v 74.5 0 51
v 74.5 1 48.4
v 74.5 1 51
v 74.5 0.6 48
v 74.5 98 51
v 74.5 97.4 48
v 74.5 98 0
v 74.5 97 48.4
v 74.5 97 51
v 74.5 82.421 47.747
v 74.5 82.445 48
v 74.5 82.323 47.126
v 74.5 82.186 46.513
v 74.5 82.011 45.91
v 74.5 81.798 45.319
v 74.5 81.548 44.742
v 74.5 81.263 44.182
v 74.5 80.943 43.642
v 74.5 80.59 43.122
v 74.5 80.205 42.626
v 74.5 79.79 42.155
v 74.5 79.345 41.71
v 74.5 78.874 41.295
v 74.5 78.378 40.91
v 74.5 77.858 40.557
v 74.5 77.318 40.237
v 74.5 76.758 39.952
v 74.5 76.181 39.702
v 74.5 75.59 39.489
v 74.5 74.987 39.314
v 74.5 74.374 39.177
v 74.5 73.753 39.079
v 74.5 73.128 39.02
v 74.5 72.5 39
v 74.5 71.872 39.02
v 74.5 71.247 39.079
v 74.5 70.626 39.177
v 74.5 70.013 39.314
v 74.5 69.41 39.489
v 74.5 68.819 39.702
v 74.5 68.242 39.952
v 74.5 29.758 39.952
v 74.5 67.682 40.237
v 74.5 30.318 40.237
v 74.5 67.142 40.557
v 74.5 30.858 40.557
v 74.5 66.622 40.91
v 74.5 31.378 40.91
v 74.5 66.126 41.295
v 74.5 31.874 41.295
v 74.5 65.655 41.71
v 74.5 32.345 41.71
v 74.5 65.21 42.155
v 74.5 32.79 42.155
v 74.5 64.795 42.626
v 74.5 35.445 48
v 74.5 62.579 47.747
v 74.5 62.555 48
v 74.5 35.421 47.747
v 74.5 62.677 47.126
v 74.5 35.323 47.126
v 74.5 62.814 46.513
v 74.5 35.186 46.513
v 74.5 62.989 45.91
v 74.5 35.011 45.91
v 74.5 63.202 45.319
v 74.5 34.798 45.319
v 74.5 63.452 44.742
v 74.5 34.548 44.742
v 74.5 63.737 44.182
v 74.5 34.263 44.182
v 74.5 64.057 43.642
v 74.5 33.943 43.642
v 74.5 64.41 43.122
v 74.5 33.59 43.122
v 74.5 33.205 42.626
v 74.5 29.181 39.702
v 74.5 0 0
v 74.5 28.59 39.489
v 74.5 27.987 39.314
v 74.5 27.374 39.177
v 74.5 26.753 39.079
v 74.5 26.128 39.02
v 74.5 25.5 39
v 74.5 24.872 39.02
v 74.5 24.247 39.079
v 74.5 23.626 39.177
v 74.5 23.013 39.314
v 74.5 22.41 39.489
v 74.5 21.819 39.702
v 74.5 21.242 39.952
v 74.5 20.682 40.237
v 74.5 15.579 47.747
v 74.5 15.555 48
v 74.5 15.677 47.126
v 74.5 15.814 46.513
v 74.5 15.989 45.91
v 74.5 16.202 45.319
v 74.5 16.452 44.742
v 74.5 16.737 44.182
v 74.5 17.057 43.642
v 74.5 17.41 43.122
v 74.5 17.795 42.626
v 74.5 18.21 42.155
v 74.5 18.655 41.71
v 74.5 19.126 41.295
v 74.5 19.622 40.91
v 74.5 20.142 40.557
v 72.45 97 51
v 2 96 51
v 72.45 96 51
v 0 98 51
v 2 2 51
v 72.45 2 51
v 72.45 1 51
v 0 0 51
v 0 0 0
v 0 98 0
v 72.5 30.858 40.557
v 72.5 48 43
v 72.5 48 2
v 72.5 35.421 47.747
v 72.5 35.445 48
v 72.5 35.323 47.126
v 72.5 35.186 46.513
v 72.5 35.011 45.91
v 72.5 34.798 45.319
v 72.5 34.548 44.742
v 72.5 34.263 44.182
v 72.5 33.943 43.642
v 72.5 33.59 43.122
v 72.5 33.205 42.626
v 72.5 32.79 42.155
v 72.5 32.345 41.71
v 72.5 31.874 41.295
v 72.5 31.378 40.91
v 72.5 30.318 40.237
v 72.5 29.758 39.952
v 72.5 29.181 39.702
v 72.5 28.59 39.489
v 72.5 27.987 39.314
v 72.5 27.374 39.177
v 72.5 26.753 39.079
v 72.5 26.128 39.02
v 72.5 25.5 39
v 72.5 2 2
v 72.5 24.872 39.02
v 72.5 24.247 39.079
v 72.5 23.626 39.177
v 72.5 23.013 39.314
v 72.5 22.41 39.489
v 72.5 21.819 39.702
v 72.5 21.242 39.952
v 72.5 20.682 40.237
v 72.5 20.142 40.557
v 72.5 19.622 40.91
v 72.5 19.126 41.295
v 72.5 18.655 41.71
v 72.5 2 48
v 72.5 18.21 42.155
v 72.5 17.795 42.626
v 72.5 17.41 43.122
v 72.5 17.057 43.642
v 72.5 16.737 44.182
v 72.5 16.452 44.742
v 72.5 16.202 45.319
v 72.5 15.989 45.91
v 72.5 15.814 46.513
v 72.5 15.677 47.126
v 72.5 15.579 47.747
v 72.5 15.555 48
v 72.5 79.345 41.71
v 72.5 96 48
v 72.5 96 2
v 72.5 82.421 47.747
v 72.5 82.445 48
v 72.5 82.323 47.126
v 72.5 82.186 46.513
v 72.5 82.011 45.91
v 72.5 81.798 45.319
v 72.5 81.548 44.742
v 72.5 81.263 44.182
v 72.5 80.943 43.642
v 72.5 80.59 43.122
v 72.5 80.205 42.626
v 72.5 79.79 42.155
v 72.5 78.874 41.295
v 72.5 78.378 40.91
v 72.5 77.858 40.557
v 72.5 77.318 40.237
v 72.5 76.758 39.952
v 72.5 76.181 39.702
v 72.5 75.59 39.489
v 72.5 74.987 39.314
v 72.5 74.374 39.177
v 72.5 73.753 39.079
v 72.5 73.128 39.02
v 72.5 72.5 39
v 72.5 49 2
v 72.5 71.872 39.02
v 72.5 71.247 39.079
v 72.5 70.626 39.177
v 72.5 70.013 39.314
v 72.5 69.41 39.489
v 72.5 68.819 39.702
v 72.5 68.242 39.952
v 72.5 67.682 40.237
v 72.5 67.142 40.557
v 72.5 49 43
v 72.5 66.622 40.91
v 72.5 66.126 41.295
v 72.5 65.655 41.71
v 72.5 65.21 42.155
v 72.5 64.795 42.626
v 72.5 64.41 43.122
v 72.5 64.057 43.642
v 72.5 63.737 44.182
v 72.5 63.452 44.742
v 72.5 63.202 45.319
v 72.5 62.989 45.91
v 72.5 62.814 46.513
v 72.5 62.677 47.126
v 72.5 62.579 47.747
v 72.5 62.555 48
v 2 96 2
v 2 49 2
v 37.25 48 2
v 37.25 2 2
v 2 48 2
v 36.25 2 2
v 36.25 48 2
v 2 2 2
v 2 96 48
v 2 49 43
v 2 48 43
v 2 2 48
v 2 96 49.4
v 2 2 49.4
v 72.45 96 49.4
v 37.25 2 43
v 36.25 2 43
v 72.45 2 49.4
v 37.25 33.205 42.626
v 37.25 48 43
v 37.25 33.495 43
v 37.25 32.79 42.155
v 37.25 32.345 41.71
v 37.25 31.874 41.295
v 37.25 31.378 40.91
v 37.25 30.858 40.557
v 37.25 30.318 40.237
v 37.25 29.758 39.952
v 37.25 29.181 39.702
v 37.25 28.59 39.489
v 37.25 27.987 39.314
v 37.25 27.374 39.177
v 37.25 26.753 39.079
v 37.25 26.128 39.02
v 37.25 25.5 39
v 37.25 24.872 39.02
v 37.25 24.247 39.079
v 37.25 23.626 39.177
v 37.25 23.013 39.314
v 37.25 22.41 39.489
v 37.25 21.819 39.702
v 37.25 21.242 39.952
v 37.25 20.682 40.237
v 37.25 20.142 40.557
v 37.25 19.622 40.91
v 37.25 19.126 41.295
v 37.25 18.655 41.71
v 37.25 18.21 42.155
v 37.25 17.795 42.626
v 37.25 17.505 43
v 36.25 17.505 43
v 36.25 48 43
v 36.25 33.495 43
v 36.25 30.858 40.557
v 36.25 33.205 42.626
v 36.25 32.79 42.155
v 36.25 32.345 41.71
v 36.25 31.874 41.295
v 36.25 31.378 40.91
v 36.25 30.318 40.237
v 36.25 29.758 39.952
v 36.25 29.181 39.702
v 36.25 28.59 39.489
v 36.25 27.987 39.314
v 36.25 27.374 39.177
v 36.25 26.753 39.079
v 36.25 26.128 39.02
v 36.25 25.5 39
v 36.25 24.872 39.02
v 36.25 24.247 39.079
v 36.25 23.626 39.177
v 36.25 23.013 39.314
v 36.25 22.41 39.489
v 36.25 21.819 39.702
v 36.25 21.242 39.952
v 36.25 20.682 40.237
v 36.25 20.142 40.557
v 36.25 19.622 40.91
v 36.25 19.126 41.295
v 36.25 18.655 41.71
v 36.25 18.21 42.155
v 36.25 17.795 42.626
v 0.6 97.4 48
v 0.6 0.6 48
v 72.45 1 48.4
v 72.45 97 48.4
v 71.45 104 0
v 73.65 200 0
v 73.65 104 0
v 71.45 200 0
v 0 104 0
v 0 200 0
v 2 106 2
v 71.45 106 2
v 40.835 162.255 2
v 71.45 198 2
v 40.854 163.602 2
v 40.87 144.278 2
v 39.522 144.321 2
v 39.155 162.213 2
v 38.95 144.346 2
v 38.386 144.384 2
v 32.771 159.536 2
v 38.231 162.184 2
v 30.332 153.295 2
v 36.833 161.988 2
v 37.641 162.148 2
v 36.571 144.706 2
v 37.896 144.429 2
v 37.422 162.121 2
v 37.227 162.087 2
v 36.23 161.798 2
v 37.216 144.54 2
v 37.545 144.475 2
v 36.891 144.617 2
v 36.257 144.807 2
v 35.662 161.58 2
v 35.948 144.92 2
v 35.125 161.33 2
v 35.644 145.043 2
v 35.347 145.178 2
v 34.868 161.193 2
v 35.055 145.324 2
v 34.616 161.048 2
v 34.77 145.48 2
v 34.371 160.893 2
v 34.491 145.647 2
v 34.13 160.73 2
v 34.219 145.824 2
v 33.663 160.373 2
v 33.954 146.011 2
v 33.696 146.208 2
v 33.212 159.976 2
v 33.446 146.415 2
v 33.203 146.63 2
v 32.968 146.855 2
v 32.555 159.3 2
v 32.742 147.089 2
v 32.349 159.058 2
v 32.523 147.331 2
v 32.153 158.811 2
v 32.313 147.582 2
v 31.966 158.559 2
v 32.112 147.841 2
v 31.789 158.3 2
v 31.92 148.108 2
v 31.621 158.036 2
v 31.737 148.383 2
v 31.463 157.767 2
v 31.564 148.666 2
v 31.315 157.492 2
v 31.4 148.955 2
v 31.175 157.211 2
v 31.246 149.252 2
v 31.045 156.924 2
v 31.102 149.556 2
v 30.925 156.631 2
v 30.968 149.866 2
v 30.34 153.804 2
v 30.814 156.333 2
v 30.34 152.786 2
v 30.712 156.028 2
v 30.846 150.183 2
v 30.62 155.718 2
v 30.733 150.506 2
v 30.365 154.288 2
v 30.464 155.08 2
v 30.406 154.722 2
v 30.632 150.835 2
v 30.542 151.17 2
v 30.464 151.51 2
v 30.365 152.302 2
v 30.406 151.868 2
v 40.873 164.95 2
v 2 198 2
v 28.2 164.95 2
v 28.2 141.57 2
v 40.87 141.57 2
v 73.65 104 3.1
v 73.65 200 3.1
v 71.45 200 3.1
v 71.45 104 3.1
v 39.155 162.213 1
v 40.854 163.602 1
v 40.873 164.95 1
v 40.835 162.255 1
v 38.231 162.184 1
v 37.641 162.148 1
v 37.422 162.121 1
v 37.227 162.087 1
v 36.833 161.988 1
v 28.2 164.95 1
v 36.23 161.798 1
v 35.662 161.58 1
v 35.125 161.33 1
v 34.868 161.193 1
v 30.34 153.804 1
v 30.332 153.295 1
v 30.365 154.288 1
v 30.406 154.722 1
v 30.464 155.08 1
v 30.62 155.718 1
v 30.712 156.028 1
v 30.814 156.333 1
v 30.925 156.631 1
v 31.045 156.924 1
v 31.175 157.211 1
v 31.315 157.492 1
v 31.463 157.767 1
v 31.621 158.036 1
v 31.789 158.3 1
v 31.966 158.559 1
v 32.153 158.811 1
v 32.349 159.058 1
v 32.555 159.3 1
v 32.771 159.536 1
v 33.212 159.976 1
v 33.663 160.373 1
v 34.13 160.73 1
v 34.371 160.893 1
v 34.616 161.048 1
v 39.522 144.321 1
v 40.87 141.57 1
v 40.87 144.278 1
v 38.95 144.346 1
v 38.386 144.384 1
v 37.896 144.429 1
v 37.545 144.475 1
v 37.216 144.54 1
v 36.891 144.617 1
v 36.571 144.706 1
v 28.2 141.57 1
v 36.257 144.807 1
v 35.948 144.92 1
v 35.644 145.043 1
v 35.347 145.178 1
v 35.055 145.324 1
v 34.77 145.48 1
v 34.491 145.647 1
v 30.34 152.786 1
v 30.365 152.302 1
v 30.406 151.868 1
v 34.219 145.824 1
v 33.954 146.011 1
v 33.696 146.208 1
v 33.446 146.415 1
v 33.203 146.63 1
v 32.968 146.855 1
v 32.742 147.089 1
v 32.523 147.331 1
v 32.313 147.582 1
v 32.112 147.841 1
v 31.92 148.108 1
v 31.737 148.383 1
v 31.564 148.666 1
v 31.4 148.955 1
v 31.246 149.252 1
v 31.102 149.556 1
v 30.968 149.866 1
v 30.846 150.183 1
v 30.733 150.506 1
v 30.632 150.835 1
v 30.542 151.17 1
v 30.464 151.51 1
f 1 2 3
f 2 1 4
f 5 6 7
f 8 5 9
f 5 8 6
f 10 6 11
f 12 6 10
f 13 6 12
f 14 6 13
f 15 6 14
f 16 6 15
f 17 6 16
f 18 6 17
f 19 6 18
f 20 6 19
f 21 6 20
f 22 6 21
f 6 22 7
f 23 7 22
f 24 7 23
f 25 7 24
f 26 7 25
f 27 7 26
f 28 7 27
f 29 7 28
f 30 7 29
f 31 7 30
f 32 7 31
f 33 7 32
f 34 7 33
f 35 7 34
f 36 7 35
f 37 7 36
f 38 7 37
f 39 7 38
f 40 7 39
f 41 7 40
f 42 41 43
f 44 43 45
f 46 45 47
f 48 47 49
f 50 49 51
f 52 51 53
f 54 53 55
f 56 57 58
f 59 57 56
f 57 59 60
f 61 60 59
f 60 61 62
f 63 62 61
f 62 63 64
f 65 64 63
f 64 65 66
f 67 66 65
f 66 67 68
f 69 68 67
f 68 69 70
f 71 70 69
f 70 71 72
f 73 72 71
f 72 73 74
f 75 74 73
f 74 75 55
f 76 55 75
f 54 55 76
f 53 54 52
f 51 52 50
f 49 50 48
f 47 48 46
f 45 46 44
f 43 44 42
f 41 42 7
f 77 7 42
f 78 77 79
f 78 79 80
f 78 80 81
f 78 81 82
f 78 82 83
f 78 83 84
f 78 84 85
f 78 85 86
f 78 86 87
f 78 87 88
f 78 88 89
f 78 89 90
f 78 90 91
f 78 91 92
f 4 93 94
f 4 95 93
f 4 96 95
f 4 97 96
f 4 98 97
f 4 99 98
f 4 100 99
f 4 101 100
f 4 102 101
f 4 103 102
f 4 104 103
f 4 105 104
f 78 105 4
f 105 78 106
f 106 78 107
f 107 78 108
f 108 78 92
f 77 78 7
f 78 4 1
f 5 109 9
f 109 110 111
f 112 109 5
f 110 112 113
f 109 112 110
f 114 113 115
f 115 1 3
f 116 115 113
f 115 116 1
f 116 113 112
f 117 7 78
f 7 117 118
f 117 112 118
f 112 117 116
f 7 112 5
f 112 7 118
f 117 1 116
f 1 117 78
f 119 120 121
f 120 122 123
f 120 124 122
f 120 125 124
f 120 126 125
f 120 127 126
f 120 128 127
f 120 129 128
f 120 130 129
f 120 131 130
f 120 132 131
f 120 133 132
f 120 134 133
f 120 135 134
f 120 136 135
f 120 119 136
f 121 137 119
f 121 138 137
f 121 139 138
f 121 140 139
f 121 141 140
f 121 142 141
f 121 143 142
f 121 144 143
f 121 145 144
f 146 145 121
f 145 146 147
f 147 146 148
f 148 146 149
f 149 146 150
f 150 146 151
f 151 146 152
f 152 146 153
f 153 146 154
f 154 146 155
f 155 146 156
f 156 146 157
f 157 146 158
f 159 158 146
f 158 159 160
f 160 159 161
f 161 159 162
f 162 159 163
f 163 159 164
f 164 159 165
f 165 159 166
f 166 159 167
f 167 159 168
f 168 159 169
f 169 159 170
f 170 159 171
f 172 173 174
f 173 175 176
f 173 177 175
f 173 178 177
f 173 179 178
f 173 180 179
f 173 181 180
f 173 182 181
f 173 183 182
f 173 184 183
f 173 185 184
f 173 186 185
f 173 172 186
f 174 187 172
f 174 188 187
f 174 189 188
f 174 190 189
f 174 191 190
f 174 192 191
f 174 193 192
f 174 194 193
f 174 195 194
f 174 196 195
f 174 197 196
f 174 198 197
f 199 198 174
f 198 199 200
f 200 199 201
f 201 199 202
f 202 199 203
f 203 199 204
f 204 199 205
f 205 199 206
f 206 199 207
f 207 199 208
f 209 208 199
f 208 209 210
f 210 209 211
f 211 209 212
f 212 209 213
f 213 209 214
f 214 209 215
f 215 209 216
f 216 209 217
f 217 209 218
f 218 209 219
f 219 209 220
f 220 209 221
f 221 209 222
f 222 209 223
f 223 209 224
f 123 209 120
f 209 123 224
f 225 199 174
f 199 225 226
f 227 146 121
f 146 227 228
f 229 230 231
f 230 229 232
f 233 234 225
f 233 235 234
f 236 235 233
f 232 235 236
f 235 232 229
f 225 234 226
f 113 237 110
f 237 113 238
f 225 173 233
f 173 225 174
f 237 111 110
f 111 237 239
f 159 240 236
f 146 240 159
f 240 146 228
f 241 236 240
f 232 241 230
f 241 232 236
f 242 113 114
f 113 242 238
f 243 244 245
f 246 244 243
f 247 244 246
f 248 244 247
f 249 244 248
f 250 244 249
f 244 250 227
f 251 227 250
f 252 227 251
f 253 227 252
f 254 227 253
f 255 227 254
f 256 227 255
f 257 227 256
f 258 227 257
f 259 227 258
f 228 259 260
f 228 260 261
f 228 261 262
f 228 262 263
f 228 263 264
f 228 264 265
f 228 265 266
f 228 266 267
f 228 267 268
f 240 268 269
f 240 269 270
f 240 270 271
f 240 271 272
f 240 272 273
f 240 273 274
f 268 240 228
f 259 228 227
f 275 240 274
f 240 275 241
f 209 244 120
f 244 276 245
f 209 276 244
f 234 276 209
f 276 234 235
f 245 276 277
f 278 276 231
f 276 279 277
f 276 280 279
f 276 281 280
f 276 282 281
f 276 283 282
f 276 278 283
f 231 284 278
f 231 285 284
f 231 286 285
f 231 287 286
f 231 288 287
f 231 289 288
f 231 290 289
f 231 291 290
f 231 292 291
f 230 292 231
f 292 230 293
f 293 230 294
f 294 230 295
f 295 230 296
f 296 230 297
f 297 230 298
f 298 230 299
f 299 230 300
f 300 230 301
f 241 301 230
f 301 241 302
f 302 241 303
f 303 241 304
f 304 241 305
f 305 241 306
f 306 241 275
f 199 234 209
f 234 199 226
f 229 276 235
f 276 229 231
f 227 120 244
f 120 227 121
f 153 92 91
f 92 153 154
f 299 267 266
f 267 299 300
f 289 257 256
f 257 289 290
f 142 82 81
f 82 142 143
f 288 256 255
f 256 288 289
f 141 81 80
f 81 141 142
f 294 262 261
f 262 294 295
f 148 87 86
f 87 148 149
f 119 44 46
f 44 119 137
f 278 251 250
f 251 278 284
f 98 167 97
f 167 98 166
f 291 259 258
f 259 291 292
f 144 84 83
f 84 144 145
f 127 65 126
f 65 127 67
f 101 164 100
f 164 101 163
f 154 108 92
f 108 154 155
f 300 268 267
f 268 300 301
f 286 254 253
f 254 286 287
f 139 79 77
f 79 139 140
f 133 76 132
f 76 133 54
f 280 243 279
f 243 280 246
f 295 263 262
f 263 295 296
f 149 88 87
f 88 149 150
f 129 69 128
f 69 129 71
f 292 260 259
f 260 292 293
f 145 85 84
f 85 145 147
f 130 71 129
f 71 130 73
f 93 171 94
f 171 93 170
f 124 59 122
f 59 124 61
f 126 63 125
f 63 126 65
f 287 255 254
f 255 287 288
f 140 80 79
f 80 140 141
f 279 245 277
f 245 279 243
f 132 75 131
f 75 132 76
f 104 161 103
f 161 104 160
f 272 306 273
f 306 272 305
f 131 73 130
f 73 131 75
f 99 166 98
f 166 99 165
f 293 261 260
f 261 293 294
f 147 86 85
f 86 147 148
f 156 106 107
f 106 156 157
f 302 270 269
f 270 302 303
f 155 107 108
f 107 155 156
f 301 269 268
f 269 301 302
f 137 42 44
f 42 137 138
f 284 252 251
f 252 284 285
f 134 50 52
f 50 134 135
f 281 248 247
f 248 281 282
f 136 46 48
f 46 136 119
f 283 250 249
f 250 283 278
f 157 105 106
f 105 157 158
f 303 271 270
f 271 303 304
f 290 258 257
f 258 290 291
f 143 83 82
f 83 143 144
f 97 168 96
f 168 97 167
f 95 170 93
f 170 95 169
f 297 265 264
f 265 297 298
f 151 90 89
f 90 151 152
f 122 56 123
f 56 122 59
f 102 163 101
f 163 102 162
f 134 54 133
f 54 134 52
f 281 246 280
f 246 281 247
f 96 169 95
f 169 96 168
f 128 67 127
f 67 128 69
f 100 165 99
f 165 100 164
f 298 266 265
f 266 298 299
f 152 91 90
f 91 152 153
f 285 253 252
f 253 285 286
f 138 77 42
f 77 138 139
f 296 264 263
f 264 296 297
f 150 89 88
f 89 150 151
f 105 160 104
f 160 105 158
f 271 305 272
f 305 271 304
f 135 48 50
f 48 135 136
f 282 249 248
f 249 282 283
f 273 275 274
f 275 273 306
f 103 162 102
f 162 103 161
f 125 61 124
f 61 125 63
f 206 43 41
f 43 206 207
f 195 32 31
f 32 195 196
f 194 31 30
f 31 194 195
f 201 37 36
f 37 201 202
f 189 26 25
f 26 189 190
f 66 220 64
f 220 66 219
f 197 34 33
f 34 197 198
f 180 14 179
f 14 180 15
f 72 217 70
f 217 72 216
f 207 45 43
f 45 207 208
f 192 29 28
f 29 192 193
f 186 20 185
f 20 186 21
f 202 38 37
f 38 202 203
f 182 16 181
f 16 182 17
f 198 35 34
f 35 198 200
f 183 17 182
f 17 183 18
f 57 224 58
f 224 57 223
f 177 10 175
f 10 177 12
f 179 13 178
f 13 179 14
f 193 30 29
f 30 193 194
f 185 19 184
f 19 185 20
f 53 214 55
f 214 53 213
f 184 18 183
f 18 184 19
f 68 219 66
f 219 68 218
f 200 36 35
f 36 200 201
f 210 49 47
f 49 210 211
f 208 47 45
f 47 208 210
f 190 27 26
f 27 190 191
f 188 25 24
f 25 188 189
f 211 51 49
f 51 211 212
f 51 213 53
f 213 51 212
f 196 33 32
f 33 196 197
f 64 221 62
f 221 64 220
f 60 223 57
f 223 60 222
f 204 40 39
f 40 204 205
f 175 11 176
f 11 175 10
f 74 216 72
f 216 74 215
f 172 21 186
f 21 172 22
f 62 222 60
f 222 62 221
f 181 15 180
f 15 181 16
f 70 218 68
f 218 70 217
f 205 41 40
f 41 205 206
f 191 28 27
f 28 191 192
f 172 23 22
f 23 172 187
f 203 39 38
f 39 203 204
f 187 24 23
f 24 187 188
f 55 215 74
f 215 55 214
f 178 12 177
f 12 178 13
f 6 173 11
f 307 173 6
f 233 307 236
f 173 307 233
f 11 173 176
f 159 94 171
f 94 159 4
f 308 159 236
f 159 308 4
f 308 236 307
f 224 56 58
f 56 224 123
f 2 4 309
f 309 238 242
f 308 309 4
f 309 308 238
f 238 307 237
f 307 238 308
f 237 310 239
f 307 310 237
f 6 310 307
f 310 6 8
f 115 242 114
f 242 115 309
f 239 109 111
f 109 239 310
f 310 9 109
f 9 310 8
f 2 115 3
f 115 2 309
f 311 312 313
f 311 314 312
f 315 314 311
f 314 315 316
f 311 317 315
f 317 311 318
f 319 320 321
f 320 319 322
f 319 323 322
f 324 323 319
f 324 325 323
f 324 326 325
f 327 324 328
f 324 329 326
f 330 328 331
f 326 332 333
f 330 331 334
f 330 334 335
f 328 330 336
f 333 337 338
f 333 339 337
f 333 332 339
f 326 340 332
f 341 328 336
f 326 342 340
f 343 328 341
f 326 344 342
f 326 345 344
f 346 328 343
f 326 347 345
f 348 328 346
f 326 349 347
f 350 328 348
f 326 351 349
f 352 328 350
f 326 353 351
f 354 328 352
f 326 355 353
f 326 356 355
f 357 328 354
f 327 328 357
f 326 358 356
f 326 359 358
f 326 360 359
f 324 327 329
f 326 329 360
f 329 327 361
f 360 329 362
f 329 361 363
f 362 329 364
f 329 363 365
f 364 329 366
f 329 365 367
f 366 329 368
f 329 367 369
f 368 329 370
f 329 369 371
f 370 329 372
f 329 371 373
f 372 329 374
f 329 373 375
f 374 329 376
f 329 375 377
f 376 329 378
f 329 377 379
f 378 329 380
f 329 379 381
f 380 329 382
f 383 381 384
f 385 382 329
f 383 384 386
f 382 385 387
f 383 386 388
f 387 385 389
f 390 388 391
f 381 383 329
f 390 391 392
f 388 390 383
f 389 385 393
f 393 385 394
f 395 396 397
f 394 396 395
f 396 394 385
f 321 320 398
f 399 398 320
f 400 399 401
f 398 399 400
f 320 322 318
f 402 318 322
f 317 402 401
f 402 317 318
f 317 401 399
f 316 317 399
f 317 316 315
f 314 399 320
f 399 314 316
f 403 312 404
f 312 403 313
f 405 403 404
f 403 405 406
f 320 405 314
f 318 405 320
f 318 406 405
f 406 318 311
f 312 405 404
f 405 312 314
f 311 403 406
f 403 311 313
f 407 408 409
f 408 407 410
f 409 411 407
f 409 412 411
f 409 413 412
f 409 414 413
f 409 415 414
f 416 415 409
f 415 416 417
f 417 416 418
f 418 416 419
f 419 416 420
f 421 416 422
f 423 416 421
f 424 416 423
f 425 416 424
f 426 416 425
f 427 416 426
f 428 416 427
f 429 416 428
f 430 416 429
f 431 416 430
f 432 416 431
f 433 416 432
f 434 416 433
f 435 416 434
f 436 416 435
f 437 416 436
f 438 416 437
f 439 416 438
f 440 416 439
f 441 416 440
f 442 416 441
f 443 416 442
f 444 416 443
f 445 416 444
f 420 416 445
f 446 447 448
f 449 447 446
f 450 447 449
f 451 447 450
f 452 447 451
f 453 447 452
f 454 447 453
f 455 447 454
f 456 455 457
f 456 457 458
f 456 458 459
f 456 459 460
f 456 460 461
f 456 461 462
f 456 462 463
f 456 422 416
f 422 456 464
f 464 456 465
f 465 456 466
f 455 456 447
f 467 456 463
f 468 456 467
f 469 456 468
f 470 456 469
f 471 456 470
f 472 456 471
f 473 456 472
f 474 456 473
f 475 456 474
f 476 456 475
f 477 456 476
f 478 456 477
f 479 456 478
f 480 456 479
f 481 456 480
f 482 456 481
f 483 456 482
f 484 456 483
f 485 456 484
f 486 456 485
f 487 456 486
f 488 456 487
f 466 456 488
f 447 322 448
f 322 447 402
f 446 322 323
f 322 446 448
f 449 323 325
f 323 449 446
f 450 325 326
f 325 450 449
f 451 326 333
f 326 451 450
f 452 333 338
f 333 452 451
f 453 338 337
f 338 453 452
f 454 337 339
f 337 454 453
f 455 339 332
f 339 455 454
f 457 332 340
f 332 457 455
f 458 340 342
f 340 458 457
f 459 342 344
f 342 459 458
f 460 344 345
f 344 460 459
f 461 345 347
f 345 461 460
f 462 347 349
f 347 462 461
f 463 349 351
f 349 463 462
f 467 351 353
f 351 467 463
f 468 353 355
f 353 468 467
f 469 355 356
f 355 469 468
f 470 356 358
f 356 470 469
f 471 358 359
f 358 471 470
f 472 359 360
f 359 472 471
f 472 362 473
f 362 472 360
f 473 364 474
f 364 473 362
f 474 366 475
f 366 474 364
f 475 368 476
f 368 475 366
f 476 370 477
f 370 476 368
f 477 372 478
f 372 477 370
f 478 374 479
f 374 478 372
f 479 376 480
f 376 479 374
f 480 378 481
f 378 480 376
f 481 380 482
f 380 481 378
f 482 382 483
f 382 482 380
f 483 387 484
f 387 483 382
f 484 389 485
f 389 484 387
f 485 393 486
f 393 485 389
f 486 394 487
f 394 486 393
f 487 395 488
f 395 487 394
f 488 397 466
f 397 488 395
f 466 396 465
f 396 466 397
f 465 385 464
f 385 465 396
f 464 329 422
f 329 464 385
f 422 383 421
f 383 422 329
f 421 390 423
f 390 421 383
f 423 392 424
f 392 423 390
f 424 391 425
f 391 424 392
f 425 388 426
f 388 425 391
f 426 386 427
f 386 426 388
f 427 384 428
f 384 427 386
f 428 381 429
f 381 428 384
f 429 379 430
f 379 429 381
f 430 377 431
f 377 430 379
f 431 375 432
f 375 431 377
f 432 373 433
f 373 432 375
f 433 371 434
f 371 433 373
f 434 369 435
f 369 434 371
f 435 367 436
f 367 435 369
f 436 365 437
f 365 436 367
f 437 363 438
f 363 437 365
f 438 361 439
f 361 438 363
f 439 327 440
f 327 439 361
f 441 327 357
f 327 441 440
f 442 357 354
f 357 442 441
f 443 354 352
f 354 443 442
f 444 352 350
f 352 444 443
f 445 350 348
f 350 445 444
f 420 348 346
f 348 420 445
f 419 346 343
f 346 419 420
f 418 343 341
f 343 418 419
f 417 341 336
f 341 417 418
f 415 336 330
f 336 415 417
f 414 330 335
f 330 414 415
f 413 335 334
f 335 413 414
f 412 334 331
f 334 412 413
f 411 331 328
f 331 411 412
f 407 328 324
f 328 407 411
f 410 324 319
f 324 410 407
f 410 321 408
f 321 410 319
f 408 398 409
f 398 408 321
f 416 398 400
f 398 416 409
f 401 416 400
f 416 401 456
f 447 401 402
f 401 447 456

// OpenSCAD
// file: carcassonne_box.scad
/**
 * @file carcassonne_box.scad
 * @author Conlan Wesson
 * Template for Carcossonne boxes.
 * @copyright Creative Commons Attribution-NonCommercial-ShareAlike 4.0
 */

mm = 1;
cm = 10*mm;

width = 47*mm;
thick = 2.5*mm;
wall = 2*mm;

/**
 * Lid for box.
 * @param count Number of cards.
 * @param columns Number of columns.
 * @param icon Path to icon DXF file.
 * @param rot Icon rotation in degrees.
 * @param mult Icon scale.
 * @param xoff X-offset of icon from center.
 * @param yoff Y-offset of icon from center.
 */
module carcassonne_lid(count, columns=1, icon=false, rot=0, mult=1, xoff=0, yoff=0, g=0){
	length = (thick * count) + ((width/2) - ((thick * count) % (width/2)));
	w = length+(1.5*wall)+.1;
	l = (width*columns)+wall;
	h = wall;
	d = 2;

	CubePoints = [
		[ 0-g, 0-g,   0 ],  //0
		[ w+g, 0-g,   0 ],  //1
		[ w+g, l+g,   0 ],  //2
		[ 0-g, l+g,   0 ],  //3
		[   d,   d, h+g ],  //4
		[   w,   d, h+g ],  //5
		[   w, l-d, h+g ],  //6
		[   d, l-d, h+g ]   //7
	];
	
	CubeFaces = [
		[0,1,2,3],  // bottom
		[4,5,1,0],  // front
		[7,6,5,4],  // top
		[5,6,2,1],  // right
		[6,7,3,2],  // back
		[7,4,0,3]   // left
	];
	
	
	difference(){
		union(){
			polyhedron( CubePoints, CubeFaces );
			translate([w-wall-.15,0,0]) cube([wall+.2,l, (1.5*wall)+.1]);
		}
		if(icon){
			translate([w/2+xoff,l/3+yoff,h-(wall/2)]){
				linear_extrude(height=(wall)+.1){
					rotate(rot) scale(mult) import(icon);
				}
			}
		}
	}
}

/**
 * Carcassonne card box.
 * @param count Number of cards.
 * @param dividers Array of divider positions.
 * @param columns Number of columns.
 */
module carcassonne_box(count, dividers=[], columns=1){
	length = (thick * count) + ((width/2) - ((thick * count) % (width/2)));
	difference(){
		union(){
			difference(){
				// Outer walls
				cube([length+(2*wall), (width*columns)+(2*wall), width+(2*wall)]);
				// Cavity
				translate([wall, wall, wall]){
					cube([length, width*columns, (width+wall)+.1]);
				}
			}
			// Dividers
			for(col = [0:columns-1]){
				for(div = dividers[col]){
					translate([(div*(width/2))+(wall/2), width*col+wall, 0]) cube([wall/2, width, width-(2*wall)]);
				}
				if(col > 0){
					translate([0, width*col+(wall/2), 0]) cube([length+(2*wall), wall/2, width-(2*wall)]);
				}
			}
		}
		union(){
			// Notch
			for(col = [0:columns-1]){
				translate([wall, wall+(width*col), wall]){
					translate([0, width/2, width])
					rotate([0, 90, 0]){
						cylinder(r=10, h=length+(2*wall), $fn=100);
					}
				}
			}
			// Track
			translate([wall/2,wall/2,width+wall/2]) carcassonne_lid(count, columns, g=0.4);
		}
	}
}
// main file
/**
 * @file bridgescastlesbazaars.scad
 * @author Conlan Wesson
 * Bridges, Castles, and Bazaars Carcossonne box.
 * @copyright Creative Commons Attribution-NonCommercial-ShareAlike 4.0
 */

include <carcassonne_box.scad>

count = 24;
dividers = [[1.5]];
columns = 2;

carcassonne_box(count, dividers, columns);
translate([0,width*columns+10,0]) carcassonne_lid(count, columns, icon="bridgescastlesbazaars.dxf", rot=-90, mult=0.07, xoff=-10, yoff=30);
